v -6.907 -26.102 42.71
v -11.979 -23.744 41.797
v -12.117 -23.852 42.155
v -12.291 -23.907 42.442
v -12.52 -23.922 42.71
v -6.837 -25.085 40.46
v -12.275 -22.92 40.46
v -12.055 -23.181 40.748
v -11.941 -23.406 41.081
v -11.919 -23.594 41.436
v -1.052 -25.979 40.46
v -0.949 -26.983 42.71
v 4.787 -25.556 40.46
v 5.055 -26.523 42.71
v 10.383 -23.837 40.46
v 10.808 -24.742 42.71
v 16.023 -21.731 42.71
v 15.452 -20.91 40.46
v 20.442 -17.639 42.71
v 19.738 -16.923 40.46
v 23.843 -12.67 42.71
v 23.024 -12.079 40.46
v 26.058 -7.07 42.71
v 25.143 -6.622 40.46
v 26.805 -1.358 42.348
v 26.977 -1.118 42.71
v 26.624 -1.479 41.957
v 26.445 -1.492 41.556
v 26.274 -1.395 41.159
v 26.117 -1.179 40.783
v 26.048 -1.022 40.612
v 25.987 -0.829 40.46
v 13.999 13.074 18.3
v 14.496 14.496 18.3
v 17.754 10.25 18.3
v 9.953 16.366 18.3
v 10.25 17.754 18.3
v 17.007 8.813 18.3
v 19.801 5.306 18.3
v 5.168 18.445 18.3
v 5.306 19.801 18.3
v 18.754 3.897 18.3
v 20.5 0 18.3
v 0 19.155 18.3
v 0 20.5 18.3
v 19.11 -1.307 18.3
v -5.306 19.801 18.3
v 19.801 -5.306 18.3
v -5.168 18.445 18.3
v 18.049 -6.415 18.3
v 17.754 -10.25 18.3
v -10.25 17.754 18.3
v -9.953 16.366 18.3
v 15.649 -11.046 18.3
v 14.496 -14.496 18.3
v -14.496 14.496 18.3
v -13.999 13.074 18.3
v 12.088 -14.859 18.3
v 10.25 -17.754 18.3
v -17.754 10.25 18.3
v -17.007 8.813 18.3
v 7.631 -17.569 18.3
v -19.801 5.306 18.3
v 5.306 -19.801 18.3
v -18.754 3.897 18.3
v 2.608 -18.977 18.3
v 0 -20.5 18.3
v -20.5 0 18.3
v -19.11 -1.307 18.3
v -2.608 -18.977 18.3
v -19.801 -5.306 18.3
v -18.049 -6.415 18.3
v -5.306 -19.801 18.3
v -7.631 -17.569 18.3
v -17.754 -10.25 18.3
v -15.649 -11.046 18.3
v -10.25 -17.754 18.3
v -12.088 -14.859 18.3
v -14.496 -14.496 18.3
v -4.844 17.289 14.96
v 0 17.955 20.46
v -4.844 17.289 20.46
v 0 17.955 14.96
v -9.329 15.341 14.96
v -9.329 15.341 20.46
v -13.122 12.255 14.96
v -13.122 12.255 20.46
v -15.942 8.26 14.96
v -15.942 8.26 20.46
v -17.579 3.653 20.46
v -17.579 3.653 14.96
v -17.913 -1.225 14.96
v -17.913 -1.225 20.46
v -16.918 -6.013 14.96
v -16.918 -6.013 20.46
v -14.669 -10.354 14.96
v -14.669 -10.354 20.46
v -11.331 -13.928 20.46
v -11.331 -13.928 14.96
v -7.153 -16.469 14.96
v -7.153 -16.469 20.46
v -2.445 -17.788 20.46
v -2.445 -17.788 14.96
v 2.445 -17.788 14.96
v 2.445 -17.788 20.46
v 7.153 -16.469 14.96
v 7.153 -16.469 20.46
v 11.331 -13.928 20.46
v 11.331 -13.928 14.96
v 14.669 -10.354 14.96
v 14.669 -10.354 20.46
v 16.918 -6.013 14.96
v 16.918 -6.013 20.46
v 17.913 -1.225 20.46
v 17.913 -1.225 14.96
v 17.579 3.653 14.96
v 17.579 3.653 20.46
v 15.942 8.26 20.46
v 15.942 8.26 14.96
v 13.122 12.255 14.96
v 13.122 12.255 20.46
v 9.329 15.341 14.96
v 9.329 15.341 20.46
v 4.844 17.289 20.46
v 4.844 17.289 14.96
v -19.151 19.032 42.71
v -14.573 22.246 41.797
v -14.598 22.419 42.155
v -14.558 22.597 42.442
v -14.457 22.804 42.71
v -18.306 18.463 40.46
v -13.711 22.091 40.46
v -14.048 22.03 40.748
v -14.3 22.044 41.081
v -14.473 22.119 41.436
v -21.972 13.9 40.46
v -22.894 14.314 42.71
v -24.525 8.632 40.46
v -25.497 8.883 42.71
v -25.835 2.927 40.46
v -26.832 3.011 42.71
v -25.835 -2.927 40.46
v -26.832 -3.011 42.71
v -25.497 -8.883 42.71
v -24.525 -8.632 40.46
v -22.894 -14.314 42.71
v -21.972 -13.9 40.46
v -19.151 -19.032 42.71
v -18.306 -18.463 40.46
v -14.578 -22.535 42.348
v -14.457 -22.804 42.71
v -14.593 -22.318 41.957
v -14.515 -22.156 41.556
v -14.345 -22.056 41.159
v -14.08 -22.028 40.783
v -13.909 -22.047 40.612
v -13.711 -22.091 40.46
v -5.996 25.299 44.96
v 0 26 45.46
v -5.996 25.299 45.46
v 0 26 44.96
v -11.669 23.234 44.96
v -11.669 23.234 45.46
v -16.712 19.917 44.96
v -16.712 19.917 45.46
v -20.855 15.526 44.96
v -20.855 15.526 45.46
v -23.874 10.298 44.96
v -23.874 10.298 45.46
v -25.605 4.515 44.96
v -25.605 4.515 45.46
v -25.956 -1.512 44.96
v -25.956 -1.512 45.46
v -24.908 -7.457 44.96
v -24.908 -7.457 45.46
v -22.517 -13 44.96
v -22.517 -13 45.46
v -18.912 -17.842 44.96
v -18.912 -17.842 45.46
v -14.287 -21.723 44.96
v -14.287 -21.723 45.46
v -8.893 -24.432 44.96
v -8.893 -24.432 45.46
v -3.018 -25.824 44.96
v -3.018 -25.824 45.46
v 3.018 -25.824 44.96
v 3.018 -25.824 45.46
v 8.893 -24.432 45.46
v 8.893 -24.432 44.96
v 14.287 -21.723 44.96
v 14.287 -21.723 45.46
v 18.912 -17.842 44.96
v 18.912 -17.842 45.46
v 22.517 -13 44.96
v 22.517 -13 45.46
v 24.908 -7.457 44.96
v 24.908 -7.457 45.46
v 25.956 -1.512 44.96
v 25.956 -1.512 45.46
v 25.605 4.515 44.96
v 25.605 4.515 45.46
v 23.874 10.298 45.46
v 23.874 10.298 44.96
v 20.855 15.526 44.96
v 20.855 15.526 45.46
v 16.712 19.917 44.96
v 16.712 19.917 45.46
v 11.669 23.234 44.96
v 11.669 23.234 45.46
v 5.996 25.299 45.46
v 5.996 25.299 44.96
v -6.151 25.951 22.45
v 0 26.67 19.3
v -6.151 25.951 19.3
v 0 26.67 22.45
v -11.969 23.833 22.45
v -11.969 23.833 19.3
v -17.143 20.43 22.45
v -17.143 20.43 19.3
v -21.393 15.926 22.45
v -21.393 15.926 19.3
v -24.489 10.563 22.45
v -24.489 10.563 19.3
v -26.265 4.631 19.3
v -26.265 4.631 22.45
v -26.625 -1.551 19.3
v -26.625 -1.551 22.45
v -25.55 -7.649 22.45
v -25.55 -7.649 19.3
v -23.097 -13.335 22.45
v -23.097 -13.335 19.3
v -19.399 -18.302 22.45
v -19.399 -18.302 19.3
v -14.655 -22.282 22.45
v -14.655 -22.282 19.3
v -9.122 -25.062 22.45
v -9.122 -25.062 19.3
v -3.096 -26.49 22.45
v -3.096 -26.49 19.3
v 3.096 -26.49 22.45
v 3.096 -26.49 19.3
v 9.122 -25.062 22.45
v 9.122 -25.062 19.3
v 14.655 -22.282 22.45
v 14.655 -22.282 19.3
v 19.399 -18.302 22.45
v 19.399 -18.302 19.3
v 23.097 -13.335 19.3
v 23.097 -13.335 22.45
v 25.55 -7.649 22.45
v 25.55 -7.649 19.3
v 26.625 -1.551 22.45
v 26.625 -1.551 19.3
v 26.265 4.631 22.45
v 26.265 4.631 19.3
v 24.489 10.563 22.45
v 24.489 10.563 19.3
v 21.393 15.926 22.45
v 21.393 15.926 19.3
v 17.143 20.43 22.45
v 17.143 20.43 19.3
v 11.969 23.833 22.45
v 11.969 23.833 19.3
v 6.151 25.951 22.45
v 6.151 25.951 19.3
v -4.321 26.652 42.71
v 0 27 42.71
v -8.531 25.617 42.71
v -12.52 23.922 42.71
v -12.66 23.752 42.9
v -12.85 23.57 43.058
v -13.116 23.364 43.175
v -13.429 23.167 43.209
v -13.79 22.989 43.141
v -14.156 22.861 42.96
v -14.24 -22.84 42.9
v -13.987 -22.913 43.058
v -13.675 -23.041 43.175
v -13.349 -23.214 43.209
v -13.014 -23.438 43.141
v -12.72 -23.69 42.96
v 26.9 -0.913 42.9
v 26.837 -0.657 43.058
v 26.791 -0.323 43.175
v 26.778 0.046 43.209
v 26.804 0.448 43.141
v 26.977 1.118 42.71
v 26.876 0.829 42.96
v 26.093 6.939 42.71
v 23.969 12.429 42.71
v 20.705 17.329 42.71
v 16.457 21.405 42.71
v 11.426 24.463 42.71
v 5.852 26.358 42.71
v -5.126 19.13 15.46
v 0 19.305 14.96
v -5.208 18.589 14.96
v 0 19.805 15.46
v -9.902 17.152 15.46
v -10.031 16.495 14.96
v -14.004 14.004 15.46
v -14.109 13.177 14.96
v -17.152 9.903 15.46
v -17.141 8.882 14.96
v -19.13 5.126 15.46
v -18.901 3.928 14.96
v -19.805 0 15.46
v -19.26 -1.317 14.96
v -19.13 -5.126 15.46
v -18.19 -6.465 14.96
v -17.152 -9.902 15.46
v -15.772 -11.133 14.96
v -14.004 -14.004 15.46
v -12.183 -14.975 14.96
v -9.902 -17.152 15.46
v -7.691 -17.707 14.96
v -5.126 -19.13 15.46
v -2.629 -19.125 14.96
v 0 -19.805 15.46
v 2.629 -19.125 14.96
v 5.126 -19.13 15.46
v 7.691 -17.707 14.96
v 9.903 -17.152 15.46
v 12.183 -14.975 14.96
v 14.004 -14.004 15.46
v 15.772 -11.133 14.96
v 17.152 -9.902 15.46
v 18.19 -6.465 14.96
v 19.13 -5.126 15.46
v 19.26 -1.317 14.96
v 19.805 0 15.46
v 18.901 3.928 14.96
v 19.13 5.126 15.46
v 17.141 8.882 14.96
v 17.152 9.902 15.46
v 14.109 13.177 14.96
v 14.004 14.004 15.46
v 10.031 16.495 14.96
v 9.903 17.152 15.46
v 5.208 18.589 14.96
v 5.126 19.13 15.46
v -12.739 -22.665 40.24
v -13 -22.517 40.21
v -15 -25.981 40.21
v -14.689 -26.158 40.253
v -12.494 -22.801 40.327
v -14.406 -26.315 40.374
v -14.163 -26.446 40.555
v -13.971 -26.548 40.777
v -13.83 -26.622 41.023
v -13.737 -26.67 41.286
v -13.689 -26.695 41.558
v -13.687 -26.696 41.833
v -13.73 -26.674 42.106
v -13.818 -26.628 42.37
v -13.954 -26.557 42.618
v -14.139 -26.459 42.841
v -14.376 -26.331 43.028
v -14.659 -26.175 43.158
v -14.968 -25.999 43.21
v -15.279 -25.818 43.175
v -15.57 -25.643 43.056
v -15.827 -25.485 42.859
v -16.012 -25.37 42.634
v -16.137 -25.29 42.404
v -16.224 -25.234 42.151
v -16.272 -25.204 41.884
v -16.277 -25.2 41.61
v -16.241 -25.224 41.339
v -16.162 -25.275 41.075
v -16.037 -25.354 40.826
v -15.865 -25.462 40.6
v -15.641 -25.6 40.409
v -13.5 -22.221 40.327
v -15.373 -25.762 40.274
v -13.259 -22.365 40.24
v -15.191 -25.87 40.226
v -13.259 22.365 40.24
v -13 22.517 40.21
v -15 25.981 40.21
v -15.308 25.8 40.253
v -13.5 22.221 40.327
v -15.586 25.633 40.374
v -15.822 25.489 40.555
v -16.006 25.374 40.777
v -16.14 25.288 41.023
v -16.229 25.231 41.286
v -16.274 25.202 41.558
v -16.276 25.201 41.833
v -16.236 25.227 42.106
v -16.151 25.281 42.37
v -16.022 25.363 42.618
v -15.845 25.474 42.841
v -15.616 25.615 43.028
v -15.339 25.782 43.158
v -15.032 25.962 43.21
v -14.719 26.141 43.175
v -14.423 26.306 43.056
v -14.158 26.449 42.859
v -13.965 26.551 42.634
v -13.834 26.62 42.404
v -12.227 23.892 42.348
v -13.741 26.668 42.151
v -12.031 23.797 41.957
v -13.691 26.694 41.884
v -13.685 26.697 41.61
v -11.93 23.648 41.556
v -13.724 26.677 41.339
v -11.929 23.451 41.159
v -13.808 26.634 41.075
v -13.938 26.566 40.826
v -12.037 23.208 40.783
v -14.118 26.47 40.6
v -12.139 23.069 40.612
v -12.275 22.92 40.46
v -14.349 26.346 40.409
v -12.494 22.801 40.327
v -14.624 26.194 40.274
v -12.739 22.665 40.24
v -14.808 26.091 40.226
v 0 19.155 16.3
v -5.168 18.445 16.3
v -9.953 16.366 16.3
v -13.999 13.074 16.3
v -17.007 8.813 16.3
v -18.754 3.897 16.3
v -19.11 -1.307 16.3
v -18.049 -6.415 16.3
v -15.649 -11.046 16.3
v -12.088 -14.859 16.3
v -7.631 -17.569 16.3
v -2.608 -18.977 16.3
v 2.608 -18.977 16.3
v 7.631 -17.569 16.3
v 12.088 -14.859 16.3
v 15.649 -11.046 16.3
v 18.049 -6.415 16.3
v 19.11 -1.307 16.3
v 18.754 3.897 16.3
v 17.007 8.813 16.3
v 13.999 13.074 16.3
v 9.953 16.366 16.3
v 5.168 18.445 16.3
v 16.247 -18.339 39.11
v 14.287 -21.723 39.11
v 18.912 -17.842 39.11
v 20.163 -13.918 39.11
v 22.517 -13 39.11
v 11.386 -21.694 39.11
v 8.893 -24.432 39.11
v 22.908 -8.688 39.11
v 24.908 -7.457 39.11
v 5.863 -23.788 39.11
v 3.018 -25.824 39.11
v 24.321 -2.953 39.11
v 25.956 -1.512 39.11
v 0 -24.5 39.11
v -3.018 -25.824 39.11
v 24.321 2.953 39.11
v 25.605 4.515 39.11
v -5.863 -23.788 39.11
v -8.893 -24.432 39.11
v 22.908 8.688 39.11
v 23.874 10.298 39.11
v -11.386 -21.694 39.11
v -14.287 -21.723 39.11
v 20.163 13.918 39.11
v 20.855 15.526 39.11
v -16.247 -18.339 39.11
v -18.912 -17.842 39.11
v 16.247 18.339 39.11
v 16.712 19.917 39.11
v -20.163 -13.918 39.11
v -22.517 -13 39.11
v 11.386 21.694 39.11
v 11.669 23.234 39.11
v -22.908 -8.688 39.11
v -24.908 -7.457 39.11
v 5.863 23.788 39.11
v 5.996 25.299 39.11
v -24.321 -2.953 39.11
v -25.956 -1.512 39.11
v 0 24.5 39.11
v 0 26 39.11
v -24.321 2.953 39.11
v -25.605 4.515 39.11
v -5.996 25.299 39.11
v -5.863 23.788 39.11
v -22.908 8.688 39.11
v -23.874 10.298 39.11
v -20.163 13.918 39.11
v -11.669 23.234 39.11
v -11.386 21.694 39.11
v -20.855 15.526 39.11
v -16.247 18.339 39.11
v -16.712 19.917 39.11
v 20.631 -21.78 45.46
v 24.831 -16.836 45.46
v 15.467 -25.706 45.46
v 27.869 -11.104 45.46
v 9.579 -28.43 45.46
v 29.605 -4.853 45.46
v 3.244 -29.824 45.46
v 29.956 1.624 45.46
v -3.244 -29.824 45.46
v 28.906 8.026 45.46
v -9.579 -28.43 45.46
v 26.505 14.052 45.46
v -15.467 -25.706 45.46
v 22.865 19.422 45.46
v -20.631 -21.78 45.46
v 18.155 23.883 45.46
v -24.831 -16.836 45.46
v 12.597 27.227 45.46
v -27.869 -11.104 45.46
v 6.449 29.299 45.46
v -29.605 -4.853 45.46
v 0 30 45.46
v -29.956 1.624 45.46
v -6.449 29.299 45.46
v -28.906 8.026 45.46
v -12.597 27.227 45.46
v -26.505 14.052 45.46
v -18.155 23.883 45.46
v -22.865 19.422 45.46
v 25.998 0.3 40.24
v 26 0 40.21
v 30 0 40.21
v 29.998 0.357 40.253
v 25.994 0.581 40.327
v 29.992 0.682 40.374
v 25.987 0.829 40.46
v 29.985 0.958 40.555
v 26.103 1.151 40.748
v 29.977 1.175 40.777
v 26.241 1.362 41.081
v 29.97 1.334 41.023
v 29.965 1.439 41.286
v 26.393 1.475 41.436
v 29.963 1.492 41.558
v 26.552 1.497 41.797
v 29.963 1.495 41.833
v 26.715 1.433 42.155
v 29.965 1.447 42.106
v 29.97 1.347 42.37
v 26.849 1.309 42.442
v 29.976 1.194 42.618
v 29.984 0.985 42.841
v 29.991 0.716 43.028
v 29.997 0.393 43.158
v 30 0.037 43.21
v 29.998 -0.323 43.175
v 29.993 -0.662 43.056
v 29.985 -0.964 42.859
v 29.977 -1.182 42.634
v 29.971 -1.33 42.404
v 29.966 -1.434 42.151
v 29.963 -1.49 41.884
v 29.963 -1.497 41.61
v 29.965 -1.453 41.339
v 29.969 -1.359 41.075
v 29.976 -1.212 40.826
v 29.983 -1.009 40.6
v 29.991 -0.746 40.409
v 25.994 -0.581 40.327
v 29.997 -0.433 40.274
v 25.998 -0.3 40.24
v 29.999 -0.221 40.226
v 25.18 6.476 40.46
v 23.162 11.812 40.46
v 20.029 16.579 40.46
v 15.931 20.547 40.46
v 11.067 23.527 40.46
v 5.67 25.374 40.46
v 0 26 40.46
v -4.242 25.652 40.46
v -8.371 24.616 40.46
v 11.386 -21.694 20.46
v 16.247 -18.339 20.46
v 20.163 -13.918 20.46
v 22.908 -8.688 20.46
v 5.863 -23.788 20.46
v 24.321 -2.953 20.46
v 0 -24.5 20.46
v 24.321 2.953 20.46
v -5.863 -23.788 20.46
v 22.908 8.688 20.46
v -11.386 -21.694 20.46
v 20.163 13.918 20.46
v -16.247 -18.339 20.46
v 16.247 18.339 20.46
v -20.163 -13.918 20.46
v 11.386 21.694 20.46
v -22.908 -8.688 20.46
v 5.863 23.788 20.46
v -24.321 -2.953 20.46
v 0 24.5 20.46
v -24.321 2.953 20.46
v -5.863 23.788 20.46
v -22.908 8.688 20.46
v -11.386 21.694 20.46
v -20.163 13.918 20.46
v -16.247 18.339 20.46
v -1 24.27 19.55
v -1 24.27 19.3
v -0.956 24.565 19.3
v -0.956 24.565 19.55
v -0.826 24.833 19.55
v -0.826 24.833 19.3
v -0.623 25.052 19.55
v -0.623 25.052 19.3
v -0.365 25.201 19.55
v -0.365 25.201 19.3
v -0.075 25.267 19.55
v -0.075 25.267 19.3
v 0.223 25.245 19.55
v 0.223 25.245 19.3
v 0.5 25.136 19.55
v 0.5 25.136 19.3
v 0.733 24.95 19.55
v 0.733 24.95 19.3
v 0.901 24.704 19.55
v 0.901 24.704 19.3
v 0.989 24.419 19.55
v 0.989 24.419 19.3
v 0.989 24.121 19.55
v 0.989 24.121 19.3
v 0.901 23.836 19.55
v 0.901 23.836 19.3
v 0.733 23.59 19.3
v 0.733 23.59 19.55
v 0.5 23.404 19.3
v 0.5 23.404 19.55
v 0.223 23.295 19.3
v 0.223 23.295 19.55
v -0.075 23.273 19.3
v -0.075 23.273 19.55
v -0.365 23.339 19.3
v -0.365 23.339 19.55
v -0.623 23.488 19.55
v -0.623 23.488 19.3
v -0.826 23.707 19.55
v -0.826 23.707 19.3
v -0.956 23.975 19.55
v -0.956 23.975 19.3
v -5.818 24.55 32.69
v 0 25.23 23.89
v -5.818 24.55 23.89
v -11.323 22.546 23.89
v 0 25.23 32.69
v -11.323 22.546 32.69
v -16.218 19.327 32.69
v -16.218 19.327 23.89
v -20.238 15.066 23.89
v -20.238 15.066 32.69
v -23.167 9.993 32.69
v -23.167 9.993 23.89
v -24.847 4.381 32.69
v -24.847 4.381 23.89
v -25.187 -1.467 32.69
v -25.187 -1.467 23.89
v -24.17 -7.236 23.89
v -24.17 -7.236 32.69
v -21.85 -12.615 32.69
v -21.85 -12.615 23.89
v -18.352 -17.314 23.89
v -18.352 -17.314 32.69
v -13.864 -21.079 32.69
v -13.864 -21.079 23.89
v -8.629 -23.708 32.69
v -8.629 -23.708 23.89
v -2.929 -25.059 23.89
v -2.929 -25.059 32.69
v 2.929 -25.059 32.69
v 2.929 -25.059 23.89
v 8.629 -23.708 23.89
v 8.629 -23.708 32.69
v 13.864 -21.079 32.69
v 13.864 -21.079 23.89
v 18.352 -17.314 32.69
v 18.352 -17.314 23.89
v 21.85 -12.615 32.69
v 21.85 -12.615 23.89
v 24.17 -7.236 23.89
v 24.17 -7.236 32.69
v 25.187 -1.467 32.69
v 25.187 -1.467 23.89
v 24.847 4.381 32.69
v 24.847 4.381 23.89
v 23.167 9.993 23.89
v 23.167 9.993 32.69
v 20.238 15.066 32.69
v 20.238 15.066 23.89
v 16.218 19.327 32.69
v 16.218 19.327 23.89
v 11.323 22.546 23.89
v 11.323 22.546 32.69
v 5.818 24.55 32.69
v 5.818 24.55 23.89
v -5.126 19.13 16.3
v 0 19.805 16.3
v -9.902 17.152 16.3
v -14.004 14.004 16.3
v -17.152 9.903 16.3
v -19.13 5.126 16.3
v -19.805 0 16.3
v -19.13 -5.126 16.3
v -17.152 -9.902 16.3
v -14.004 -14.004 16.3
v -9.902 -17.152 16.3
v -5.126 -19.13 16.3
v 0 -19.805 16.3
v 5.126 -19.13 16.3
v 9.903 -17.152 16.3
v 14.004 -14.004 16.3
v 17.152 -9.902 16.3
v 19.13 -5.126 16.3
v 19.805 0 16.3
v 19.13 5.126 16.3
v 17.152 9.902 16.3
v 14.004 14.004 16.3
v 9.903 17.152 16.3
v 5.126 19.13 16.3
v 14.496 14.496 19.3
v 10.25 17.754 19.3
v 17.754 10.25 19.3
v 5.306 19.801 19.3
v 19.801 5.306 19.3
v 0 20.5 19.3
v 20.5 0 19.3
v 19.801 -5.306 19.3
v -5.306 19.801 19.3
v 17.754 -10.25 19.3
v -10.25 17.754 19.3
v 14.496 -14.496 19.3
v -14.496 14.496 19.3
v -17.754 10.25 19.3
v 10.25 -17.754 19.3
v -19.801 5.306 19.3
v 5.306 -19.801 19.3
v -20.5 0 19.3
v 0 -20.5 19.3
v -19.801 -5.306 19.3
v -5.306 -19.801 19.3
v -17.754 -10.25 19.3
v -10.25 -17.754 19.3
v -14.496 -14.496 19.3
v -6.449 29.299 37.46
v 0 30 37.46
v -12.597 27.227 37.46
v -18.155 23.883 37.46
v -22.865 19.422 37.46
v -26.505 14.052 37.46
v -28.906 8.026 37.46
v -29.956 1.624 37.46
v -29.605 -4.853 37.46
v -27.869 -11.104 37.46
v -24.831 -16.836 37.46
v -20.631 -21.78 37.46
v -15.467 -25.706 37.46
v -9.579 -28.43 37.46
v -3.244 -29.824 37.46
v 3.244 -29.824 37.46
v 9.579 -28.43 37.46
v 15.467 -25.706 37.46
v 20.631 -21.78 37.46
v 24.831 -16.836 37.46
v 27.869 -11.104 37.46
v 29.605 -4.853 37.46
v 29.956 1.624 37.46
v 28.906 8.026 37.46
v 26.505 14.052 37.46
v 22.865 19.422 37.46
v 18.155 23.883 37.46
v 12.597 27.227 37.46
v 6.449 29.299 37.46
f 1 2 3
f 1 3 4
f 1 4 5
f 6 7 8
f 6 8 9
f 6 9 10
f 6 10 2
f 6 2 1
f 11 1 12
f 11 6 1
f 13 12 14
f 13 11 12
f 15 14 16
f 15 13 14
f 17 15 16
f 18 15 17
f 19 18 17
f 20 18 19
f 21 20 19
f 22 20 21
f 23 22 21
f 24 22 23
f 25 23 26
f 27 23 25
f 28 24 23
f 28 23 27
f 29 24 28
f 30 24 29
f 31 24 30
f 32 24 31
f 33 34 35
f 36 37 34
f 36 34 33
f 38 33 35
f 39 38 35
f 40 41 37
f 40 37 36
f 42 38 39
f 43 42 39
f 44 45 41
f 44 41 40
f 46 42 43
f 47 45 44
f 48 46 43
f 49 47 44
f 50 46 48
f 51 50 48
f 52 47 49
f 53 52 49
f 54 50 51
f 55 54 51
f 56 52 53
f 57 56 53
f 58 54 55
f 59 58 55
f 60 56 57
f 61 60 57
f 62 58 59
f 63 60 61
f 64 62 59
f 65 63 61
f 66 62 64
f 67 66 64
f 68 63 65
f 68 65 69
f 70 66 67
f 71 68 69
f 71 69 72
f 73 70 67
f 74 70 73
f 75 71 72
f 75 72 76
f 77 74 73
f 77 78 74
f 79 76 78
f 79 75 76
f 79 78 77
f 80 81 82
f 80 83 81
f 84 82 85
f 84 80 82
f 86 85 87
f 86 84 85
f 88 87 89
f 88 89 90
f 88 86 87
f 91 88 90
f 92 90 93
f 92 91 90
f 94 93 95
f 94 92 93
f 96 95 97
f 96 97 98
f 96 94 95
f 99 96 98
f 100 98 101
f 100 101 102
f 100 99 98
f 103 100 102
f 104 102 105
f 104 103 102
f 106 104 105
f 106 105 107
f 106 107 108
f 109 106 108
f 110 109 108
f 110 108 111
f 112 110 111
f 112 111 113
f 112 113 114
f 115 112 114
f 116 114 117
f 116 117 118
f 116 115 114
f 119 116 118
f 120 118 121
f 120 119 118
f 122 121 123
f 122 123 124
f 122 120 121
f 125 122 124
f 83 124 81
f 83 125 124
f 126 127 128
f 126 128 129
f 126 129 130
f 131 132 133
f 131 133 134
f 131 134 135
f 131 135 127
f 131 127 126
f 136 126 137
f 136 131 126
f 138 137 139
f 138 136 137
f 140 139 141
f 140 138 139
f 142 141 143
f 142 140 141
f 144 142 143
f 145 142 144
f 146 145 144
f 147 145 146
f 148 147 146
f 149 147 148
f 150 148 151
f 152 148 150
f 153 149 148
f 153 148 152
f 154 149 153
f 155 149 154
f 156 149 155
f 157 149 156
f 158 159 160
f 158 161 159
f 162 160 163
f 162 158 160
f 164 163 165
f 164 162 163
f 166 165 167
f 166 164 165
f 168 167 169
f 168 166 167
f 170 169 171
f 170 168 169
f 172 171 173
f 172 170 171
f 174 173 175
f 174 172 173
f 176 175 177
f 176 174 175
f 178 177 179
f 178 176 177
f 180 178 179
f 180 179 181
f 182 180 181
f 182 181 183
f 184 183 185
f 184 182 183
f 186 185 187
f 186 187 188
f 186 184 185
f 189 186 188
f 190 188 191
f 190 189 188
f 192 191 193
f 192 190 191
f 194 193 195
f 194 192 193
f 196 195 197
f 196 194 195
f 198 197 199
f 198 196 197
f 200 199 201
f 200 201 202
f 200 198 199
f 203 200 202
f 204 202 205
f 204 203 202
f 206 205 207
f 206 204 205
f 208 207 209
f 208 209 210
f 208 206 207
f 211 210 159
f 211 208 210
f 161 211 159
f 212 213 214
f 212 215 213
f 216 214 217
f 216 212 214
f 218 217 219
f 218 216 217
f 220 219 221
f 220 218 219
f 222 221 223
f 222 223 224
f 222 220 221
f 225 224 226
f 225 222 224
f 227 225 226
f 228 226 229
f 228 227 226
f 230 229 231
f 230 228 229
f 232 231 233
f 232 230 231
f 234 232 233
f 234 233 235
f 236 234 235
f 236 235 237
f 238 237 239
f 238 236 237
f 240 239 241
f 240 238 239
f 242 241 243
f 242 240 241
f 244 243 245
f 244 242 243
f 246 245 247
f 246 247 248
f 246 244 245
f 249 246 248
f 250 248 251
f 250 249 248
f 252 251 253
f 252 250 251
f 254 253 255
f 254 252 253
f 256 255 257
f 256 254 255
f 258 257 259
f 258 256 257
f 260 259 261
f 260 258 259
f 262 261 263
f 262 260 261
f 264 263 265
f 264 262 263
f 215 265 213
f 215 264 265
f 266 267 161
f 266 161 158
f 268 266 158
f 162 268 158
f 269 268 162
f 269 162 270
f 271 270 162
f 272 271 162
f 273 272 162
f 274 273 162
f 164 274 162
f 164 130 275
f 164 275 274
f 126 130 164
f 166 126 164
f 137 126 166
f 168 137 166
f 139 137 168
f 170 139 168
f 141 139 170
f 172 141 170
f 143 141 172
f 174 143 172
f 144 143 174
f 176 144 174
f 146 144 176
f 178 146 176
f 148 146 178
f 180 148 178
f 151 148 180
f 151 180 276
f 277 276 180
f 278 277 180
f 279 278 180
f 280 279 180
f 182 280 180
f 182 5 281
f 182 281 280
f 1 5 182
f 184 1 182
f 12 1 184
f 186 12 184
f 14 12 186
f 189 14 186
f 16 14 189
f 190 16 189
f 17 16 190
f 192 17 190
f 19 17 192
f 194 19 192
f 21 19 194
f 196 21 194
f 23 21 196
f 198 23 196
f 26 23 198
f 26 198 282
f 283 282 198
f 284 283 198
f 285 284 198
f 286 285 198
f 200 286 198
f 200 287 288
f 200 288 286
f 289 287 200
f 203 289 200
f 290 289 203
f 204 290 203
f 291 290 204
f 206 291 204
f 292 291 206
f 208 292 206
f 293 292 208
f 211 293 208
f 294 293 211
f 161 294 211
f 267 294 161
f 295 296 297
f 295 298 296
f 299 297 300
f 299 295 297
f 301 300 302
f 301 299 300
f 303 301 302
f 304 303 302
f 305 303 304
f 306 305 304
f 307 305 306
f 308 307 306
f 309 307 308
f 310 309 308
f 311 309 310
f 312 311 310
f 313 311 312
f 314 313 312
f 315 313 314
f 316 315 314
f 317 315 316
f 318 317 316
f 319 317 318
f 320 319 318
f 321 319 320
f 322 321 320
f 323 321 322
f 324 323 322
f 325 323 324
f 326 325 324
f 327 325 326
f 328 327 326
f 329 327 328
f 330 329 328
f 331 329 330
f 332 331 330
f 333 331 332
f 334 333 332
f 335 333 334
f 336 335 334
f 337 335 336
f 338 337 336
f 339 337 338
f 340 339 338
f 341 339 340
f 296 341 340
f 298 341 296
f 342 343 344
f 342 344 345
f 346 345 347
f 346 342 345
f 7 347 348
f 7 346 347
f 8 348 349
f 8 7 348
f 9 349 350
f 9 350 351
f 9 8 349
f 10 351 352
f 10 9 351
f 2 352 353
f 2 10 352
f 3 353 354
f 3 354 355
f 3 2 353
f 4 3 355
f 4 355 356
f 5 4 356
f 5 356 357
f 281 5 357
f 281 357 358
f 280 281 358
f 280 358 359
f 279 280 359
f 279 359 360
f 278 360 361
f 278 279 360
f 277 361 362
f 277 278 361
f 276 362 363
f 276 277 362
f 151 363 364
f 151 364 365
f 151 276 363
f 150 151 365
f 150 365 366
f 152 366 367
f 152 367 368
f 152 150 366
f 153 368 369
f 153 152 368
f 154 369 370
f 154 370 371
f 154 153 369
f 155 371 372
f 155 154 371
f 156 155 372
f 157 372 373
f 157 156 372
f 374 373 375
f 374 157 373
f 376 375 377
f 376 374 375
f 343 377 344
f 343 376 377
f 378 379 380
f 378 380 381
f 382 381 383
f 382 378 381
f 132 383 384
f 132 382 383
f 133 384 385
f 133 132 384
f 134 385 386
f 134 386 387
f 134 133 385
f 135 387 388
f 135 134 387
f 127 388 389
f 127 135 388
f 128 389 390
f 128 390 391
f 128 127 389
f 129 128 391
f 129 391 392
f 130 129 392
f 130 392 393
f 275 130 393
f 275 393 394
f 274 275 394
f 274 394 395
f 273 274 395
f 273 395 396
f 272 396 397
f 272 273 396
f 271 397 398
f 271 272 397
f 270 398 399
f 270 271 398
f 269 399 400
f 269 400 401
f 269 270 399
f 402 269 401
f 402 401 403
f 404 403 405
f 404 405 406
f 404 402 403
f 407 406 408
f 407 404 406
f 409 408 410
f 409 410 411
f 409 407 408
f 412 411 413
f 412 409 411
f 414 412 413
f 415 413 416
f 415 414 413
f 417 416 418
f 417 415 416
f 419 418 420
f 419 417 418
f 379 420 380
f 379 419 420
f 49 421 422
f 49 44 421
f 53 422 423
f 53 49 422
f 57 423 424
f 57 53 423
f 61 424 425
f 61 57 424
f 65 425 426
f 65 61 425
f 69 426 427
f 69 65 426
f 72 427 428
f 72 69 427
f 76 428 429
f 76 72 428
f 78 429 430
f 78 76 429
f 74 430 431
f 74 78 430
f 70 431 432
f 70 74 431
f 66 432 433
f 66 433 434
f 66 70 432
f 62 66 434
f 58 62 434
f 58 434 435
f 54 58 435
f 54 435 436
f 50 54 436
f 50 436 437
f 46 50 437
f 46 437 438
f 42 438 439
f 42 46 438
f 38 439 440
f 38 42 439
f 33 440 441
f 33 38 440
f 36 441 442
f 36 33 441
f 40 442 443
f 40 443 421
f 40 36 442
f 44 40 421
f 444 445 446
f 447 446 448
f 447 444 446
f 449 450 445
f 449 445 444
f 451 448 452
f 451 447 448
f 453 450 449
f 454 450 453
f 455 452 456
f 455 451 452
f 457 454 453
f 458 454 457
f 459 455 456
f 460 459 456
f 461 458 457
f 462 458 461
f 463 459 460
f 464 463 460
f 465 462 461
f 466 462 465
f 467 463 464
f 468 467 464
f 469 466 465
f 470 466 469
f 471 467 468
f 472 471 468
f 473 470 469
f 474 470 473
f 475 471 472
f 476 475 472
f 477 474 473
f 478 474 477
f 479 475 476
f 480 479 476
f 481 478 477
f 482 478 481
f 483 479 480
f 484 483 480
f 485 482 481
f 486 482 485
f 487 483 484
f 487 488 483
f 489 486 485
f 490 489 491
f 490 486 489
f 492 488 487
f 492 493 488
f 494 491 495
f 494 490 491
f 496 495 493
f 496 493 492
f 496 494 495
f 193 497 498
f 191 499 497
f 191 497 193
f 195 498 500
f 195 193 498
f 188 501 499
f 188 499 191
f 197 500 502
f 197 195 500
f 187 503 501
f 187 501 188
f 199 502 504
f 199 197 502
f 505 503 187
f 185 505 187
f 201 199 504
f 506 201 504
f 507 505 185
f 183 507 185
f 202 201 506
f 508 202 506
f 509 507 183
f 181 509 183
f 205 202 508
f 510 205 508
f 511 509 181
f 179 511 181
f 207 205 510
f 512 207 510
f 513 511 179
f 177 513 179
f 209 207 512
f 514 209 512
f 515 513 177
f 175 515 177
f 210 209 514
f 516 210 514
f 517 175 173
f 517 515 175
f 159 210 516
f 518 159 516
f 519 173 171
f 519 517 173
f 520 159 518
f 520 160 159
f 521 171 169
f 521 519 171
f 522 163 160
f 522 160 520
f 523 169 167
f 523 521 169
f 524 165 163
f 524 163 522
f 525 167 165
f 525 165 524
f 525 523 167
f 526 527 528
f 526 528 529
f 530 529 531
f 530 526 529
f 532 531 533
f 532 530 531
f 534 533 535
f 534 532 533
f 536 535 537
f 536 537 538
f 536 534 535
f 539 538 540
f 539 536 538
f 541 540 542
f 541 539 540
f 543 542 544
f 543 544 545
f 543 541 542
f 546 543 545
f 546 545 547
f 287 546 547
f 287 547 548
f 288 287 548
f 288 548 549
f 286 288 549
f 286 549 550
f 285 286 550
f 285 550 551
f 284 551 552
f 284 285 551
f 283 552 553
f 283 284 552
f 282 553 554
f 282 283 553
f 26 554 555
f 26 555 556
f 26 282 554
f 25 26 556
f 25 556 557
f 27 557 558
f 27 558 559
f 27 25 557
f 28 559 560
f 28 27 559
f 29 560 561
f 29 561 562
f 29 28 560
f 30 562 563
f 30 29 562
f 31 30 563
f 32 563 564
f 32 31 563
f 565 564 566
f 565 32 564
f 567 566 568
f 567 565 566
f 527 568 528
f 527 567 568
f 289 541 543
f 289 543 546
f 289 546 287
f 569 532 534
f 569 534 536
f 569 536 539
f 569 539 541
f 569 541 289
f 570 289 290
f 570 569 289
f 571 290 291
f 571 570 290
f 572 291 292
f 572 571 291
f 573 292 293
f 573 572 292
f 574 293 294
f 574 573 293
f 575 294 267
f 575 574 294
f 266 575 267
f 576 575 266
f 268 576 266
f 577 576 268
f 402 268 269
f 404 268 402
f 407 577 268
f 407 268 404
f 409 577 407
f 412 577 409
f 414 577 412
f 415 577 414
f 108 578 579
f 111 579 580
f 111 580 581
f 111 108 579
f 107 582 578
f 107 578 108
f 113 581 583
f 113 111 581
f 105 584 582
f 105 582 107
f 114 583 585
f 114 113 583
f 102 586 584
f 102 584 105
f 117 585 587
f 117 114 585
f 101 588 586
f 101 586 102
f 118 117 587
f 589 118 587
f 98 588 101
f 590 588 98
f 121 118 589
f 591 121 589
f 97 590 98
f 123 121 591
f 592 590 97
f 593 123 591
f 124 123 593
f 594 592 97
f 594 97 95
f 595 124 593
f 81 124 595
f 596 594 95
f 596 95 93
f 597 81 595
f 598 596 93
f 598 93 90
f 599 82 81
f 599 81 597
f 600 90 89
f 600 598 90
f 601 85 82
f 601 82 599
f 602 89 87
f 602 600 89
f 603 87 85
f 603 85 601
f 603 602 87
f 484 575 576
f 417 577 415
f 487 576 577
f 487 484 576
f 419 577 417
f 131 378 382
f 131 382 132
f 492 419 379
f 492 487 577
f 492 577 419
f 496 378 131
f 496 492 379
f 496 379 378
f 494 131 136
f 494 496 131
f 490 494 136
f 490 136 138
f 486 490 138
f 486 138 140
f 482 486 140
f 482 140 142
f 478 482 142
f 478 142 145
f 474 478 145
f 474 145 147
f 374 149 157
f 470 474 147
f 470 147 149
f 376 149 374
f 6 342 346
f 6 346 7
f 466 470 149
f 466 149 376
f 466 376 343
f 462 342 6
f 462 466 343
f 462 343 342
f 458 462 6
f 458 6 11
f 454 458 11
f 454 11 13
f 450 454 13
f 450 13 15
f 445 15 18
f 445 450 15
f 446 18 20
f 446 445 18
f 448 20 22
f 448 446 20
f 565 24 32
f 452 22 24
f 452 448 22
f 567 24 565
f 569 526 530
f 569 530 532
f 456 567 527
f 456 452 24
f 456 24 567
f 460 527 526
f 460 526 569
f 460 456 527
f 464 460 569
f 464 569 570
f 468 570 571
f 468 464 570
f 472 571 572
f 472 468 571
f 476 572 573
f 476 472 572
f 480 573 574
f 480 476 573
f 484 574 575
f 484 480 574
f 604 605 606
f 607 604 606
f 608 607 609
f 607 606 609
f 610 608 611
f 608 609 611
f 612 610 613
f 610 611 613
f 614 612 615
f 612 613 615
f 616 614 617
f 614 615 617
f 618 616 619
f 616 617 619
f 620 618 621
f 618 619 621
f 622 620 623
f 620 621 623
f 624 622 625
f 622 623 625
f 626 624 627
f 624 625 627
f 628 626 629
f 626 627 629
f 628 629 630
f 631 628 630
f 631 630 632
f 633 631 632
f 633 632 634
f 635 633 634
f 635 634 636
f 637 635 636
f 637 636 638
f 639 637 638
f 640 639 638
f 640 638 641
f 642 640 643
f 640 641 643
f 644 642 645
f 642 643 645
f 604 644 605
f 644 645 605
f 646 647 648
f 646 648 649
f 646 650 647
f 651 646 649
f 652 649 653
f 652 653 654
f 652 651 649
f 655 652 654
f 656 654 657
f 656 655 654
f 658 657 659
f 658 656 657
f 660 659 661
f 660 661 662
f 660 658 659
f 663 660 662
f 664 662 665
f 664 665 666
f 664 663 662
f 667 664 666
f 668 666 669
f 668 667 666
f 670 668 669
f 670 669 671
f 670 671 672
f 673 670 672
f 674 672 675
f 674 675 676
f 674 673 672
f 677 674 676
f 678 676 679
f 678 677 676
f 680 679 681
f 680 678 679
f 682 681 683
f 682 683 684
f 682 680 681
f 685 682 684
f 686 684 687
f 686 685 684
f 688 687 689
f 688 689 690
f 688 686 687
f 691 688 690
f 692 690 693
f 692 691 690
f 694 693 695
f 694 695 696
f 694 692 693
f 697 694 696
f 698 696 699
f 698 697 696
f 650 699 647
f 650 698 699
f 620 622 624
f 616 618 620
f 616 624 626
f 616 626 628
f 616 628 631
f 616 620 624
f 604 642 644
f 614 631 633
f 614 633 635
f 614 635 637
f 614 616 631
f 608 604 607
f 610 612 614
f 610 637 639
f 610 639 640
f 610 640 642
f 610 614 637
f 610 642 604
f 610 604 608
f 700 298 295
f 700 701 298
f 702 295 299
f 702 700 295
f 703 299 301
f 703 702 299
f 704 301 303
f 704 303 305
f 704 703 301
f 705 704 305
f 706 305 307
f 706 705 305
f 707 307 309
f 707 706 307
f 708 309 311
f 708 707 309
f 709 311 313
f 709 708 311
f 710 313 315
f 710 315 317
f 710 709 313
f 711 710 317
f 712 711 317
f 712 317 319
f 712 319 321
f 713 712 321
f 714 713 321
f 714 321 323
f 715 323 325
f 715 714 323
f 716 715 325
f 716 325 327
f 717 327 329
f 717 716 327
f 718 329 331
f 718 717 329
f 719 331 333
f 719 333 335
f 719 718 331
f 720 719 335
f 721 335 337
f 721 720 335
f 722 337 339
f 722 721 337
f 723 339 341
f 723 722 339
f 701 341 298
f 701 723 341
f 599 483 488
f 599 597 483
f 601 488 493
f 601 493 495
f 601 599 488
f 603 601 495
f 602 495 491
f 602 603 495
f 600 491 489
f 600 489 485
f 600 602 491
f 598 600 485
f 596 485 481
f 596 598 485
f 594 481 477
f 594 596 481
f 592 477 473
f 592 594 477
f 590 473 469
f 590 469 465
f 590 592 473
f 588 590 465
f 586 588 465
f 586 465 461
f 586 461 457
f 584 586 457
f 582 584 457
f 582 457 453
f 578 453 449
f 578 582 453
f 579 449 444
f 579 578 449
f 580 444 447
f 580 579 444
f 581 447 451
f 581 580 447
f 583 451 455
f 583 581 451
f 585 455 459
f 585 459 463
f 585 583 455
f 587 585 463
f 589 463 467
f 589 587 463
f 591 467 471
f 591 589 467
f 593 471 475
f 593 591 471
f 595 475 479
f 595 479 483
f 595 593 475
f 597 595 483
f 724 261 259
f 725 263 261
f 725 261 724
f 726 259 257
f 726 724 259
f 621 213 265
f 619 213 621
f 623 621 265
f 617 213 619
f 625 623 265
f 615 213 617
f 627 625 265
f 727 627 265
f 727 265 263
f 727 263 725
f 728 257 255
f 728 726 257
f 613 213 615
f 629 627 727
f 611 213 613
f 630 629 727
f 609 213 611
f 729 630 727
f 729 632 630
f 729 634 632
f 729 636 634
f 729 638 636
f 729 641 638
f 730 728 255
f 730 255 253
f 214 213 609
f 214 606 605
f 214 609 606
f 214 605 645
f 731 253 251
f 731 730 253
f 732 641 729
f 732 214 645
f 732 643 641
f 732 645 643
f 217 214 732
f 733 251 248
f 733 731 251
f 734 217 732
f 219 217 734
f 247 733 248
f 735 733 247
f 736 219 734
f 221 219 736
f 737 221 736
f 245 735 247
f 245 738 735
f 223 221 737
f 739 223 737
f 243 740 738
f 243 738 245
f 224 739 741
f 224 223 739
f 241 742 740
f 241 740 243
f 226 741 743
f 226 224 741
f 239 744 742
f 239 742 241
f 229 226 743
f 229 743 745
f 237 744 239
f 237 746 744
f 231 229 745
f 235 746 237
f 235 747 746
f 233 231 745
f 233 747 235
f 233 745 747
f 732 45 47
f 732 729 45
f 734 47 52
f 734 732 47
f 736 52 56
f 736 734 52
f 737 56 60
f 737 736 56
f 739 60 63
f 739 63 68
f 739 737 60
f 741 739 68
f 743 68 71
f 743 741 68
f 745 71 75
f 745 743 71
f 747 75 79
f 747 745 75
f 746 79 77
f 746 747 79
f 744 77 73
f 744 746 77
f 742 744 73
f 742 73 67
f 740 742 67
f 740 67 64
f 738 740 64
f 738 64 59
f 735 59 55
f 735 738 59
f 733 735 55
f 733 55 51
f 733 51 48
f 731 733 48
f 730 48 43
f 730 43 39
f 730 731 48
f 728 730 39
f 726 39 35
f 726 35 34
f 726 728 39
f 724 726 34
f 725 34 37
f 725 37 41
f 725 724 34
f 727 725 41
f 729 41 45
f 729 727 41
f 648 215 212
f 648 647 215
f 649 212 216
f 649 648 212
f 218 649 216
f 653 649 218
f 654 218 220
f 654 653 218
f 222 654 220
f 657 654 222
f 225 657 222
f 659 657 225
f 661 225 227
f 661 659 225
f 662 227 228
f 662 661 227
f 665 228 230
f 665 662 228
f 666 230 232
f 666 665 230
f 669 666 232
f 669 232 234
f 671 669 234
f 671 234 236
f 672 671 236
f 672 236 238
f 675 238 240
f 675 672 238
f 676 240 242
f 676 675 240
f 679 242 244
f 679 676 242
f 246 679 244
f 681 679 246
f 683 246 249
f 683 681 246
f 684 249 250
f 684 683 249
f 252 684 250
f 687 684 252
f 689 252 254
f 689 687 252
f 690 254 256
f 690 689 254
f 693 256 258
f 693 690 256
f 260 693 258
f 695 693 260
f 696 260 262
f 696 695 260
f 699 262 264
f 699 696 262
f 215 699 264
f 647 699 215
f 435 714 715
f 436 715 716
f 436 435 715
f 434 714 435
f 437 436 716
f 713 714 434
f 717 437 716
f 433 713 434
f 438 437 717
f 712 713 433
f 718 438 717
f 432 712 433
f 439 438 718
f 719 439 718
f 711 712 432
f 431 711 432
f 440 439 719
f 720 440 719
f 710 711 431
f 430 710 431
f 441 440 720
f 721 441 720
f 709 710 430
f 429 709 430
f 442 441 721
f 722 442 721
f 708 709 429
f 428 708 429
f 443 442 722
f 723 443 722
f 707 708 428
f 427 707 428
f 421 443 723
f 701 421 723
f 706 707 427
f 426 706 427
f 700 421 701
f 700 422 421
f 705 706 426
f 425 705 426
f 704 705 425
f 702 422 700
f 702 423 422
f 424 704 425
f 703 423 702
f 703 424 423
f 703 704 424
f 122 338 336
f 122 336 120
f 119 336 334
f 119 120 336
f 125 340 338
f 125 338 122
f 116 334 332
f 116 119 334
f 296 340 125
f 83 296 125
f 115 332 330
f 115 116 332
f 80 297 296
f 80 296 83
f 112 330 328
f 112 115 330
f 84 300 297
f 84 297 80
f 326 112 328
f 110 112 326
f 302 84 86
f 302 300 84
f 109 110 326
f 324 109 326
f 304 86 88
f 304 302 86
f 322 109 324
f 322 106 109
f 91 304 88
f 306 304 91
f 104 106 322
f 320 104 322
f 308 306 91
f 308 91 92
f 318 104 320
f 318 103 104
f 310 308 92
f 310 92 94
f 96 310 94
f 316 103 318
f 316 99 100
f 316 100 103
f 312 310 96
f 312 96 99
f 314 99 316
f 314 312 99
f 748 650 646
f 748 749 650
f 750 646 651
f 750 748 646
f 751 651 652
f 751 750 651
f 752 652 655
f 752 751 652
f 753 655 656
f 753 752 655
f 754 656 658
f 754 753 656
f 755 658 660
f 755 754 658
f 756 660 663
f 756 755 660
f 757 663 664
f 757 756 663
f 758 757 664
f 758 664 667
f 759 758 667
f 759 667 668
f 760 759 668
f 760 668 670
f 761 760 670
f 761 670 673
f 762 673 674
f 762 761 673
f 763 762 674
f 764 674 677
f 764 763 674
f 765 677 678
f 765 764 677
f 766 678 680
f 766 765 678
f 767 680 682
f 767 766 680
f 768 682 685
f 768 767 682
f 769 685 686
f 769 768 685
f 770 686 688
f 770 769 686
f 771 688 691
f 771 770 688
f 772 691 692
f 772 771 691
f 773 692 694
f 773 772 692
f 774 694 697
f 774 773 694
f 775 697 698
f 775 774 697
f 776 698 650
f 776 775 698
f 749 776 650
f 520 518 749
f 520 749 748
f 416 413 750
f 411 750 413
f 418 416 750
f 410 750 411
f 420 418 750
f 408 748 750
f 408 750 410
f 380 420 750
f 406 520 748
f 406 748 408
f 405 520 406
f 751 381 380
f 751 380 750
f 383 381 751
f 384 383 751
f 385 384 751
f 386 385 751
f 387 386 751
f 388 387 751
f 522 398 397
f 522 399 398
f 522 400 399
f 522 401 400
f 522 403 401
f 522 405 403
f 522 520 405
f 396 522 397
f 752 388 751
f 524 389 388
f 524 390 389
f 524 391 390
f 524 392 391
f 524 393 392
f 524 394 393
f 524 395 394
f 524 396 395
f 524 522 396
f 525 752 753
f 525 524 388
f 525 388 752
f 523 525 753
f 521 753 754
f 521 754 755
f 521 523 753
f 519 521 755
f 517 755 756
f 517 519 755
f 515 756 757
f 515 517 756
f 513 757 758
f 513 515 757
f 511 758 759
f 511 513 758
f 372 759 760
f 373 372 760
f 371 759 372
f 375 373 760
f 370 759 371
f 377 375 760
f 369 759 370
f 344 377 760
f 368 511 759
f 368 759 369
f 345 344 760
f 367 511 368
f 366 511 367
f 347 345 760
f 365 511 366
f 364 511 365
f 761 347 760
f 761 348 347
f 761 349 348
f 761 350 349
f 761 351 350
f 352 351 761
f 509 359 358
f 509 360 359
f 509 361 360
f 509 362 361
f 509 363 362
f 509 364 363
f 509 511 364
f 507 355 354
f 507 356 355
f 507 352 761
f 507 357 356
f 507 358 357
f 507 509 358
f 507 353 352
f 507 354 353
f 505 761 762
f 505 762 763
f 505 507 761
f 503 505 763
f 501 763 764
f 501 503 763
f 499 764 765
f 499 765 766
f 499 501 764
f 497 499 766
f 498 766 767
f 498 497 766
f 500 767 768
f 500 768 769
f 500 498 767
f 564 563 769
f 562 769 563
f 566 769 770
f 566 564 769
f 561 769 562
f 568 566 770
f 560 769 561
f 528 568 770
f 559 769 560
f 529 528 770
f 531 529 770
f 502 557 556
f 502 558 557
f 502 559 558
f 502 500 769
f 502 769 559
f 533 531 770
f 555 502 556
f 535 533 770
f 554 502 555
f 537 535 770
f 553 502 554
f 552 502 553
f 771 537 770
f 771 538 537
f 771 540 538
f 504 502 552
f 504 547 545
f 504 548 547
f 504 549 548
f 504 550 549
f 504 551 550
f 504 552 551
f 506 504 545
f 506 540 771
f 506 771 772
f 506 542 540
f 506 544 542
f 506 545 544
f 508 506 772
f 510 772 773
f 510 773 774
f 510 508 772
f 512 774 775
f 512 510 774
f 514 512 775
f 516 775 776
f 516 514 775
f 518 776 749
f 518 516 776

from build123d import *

# Parameters (mm, degrees)
ODEBRAT_START            = 25.986775
SKICA3_R                 = 1.5
ODEBRAT_VYSUNUT_M1_DEPTH = 4.013225
KRUHOV_POLE1_COUNT       = 3
SKICA4_R                 = 1
ODEBRAT_VYSUNUT_M2_DEPTH = 0.25


with BuildPart() as part:
    # Skica2 → Rotovat1 (revolve)
    with BuildSketch(Plane(origin=(0, 0, 0), x_dir=(0, 0, -1), z_dir=(1, 0, 0))):
        Polygon((-14.96, 17.955), (-14.96, 19.305), (-15.46, 19.805), (-16.3, 19.805), (-16.3, 19.155), (-18.3, 19.155), (-18.3, 20.5), (-19.3, 20.5), (-19.3, 26.67), (-22.45, 26.67), (-23.89, 25.23), (-32.69, 25.23), (-37.46, 30), (-45.46, 30), (-45.46, 26), (-44.96, 26), (-42.71, 27), (-40.46, 26), (-39.11, 26), (-39.11, 24.5), (-20.46, 24.5), (-20.46, 17.955), align=None)
    revolve(axis=Axis((0, 0, 0), (0, 0, 1)))

    # Skica3 → Odebrat vysunutím1 (cut)
    with BuildSketch(Plane(origin=(0, 0, 0), x_dir=(0, 0, -1), z_dir=(1, 0, 0)).offset(ODEBRAT_START)):
        with Locations((-41.71, 0)):
            Circle(SKICA3_R)
    odebrat_vysunut_m1 = extrude(amount=ODEBRAT_VYSUNUT_M1_DEPTH, mode=Mode.SUBTRACT)

    # Kruhové pole1: Odebrat vysunutím1 ×3 about axis
    kruhov_pole1_axis = Axis((0, 0, 0), (0, 0, -1))
    for i in range(1, KRUHOV_POLE1_COUNT):
        add(odebrat_vysunut_m1.rotate(kruhov_pole1_axis, i * 360 / KRUHOV_POLE1_COUNT), mode=Mode.SUBTRACT)

    # Skica4 → Odebrat vysunutím2 (cut)
    with BuildSketch(Plane(origin=(0, 0, 19.3), x_dir=(-1, 0, 0), z_dir=(0, 0, -1))):
        with Locations((0, 24.27)):
            Circle(SKICA4_R)
    extrude(amount=-ODEBRAT_VYSUNUT_M2_DEPTH, mode=Mode.SUBTRACT)


solid = part.part
